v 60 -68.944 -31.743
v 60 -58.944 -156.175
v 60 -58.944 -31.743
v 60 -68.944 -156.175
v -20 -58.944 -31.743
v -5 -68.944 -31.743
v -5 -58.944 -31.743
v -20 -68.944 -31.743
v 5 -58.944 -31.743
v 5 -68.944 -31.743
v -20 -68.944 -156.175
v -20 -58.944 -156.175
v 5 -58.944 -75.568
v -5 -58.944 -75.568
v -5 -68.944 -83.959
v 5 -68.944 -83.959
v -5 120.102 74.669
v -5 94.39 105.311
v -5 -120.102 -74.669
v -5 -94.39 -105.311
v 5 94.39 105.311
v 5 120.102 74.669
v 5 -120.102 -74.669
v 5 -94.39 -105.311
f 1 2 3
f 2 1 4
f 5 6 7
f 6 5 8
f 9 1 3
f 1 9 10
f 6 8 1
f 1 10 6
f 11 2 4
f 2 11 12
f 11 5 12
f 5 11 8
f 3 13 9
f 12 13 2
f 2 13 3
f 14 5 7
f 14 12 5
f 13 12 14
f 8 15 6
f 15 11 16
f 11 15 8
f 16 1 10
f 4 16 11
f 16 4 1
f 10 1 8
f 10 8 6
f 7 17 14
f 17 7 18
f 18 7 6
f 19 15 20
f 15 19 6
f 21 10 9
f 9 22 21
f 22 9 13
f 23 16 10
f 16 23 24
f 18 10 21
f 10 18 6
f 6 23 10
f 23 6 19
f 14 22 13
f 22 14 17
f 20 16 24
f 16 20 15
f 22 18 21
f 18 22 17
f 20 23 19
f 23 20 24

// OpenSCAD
module arm_extension_left(arm_x,arm_y,arm_z,attachLength,rotate_angle){
    y_tran = -(arm_y/2-attachLength)*cos(rotate_angle);
    z_tran = -(arm_y/2-attachLength)*sin(rotate_angle)-arm_z/2/cos(rotate_angle);
    translate([20,y_tran+5,z_tran-10])
    cube([80,10,arm_z/cos(rotate_angle)*2+20],center=true);
    rotate([rotate_angle,0,0])
    cube([arm_x, arm_y, arm_z],center=true); 
    
}

//size of the arm extension
arm_ex_x = 10;
arm_ex_y = 280;
arm_ex_z = 40;
//the length of arm extension attaced on the box
attachLength = 50;
z_lift = 20;
//the angle between the arm extension and the box
rotate_angle=40;
arm_extension_left(arm_ex_x,arm_ex_y,arm_ex_z,attachLength,rotate_angle);
